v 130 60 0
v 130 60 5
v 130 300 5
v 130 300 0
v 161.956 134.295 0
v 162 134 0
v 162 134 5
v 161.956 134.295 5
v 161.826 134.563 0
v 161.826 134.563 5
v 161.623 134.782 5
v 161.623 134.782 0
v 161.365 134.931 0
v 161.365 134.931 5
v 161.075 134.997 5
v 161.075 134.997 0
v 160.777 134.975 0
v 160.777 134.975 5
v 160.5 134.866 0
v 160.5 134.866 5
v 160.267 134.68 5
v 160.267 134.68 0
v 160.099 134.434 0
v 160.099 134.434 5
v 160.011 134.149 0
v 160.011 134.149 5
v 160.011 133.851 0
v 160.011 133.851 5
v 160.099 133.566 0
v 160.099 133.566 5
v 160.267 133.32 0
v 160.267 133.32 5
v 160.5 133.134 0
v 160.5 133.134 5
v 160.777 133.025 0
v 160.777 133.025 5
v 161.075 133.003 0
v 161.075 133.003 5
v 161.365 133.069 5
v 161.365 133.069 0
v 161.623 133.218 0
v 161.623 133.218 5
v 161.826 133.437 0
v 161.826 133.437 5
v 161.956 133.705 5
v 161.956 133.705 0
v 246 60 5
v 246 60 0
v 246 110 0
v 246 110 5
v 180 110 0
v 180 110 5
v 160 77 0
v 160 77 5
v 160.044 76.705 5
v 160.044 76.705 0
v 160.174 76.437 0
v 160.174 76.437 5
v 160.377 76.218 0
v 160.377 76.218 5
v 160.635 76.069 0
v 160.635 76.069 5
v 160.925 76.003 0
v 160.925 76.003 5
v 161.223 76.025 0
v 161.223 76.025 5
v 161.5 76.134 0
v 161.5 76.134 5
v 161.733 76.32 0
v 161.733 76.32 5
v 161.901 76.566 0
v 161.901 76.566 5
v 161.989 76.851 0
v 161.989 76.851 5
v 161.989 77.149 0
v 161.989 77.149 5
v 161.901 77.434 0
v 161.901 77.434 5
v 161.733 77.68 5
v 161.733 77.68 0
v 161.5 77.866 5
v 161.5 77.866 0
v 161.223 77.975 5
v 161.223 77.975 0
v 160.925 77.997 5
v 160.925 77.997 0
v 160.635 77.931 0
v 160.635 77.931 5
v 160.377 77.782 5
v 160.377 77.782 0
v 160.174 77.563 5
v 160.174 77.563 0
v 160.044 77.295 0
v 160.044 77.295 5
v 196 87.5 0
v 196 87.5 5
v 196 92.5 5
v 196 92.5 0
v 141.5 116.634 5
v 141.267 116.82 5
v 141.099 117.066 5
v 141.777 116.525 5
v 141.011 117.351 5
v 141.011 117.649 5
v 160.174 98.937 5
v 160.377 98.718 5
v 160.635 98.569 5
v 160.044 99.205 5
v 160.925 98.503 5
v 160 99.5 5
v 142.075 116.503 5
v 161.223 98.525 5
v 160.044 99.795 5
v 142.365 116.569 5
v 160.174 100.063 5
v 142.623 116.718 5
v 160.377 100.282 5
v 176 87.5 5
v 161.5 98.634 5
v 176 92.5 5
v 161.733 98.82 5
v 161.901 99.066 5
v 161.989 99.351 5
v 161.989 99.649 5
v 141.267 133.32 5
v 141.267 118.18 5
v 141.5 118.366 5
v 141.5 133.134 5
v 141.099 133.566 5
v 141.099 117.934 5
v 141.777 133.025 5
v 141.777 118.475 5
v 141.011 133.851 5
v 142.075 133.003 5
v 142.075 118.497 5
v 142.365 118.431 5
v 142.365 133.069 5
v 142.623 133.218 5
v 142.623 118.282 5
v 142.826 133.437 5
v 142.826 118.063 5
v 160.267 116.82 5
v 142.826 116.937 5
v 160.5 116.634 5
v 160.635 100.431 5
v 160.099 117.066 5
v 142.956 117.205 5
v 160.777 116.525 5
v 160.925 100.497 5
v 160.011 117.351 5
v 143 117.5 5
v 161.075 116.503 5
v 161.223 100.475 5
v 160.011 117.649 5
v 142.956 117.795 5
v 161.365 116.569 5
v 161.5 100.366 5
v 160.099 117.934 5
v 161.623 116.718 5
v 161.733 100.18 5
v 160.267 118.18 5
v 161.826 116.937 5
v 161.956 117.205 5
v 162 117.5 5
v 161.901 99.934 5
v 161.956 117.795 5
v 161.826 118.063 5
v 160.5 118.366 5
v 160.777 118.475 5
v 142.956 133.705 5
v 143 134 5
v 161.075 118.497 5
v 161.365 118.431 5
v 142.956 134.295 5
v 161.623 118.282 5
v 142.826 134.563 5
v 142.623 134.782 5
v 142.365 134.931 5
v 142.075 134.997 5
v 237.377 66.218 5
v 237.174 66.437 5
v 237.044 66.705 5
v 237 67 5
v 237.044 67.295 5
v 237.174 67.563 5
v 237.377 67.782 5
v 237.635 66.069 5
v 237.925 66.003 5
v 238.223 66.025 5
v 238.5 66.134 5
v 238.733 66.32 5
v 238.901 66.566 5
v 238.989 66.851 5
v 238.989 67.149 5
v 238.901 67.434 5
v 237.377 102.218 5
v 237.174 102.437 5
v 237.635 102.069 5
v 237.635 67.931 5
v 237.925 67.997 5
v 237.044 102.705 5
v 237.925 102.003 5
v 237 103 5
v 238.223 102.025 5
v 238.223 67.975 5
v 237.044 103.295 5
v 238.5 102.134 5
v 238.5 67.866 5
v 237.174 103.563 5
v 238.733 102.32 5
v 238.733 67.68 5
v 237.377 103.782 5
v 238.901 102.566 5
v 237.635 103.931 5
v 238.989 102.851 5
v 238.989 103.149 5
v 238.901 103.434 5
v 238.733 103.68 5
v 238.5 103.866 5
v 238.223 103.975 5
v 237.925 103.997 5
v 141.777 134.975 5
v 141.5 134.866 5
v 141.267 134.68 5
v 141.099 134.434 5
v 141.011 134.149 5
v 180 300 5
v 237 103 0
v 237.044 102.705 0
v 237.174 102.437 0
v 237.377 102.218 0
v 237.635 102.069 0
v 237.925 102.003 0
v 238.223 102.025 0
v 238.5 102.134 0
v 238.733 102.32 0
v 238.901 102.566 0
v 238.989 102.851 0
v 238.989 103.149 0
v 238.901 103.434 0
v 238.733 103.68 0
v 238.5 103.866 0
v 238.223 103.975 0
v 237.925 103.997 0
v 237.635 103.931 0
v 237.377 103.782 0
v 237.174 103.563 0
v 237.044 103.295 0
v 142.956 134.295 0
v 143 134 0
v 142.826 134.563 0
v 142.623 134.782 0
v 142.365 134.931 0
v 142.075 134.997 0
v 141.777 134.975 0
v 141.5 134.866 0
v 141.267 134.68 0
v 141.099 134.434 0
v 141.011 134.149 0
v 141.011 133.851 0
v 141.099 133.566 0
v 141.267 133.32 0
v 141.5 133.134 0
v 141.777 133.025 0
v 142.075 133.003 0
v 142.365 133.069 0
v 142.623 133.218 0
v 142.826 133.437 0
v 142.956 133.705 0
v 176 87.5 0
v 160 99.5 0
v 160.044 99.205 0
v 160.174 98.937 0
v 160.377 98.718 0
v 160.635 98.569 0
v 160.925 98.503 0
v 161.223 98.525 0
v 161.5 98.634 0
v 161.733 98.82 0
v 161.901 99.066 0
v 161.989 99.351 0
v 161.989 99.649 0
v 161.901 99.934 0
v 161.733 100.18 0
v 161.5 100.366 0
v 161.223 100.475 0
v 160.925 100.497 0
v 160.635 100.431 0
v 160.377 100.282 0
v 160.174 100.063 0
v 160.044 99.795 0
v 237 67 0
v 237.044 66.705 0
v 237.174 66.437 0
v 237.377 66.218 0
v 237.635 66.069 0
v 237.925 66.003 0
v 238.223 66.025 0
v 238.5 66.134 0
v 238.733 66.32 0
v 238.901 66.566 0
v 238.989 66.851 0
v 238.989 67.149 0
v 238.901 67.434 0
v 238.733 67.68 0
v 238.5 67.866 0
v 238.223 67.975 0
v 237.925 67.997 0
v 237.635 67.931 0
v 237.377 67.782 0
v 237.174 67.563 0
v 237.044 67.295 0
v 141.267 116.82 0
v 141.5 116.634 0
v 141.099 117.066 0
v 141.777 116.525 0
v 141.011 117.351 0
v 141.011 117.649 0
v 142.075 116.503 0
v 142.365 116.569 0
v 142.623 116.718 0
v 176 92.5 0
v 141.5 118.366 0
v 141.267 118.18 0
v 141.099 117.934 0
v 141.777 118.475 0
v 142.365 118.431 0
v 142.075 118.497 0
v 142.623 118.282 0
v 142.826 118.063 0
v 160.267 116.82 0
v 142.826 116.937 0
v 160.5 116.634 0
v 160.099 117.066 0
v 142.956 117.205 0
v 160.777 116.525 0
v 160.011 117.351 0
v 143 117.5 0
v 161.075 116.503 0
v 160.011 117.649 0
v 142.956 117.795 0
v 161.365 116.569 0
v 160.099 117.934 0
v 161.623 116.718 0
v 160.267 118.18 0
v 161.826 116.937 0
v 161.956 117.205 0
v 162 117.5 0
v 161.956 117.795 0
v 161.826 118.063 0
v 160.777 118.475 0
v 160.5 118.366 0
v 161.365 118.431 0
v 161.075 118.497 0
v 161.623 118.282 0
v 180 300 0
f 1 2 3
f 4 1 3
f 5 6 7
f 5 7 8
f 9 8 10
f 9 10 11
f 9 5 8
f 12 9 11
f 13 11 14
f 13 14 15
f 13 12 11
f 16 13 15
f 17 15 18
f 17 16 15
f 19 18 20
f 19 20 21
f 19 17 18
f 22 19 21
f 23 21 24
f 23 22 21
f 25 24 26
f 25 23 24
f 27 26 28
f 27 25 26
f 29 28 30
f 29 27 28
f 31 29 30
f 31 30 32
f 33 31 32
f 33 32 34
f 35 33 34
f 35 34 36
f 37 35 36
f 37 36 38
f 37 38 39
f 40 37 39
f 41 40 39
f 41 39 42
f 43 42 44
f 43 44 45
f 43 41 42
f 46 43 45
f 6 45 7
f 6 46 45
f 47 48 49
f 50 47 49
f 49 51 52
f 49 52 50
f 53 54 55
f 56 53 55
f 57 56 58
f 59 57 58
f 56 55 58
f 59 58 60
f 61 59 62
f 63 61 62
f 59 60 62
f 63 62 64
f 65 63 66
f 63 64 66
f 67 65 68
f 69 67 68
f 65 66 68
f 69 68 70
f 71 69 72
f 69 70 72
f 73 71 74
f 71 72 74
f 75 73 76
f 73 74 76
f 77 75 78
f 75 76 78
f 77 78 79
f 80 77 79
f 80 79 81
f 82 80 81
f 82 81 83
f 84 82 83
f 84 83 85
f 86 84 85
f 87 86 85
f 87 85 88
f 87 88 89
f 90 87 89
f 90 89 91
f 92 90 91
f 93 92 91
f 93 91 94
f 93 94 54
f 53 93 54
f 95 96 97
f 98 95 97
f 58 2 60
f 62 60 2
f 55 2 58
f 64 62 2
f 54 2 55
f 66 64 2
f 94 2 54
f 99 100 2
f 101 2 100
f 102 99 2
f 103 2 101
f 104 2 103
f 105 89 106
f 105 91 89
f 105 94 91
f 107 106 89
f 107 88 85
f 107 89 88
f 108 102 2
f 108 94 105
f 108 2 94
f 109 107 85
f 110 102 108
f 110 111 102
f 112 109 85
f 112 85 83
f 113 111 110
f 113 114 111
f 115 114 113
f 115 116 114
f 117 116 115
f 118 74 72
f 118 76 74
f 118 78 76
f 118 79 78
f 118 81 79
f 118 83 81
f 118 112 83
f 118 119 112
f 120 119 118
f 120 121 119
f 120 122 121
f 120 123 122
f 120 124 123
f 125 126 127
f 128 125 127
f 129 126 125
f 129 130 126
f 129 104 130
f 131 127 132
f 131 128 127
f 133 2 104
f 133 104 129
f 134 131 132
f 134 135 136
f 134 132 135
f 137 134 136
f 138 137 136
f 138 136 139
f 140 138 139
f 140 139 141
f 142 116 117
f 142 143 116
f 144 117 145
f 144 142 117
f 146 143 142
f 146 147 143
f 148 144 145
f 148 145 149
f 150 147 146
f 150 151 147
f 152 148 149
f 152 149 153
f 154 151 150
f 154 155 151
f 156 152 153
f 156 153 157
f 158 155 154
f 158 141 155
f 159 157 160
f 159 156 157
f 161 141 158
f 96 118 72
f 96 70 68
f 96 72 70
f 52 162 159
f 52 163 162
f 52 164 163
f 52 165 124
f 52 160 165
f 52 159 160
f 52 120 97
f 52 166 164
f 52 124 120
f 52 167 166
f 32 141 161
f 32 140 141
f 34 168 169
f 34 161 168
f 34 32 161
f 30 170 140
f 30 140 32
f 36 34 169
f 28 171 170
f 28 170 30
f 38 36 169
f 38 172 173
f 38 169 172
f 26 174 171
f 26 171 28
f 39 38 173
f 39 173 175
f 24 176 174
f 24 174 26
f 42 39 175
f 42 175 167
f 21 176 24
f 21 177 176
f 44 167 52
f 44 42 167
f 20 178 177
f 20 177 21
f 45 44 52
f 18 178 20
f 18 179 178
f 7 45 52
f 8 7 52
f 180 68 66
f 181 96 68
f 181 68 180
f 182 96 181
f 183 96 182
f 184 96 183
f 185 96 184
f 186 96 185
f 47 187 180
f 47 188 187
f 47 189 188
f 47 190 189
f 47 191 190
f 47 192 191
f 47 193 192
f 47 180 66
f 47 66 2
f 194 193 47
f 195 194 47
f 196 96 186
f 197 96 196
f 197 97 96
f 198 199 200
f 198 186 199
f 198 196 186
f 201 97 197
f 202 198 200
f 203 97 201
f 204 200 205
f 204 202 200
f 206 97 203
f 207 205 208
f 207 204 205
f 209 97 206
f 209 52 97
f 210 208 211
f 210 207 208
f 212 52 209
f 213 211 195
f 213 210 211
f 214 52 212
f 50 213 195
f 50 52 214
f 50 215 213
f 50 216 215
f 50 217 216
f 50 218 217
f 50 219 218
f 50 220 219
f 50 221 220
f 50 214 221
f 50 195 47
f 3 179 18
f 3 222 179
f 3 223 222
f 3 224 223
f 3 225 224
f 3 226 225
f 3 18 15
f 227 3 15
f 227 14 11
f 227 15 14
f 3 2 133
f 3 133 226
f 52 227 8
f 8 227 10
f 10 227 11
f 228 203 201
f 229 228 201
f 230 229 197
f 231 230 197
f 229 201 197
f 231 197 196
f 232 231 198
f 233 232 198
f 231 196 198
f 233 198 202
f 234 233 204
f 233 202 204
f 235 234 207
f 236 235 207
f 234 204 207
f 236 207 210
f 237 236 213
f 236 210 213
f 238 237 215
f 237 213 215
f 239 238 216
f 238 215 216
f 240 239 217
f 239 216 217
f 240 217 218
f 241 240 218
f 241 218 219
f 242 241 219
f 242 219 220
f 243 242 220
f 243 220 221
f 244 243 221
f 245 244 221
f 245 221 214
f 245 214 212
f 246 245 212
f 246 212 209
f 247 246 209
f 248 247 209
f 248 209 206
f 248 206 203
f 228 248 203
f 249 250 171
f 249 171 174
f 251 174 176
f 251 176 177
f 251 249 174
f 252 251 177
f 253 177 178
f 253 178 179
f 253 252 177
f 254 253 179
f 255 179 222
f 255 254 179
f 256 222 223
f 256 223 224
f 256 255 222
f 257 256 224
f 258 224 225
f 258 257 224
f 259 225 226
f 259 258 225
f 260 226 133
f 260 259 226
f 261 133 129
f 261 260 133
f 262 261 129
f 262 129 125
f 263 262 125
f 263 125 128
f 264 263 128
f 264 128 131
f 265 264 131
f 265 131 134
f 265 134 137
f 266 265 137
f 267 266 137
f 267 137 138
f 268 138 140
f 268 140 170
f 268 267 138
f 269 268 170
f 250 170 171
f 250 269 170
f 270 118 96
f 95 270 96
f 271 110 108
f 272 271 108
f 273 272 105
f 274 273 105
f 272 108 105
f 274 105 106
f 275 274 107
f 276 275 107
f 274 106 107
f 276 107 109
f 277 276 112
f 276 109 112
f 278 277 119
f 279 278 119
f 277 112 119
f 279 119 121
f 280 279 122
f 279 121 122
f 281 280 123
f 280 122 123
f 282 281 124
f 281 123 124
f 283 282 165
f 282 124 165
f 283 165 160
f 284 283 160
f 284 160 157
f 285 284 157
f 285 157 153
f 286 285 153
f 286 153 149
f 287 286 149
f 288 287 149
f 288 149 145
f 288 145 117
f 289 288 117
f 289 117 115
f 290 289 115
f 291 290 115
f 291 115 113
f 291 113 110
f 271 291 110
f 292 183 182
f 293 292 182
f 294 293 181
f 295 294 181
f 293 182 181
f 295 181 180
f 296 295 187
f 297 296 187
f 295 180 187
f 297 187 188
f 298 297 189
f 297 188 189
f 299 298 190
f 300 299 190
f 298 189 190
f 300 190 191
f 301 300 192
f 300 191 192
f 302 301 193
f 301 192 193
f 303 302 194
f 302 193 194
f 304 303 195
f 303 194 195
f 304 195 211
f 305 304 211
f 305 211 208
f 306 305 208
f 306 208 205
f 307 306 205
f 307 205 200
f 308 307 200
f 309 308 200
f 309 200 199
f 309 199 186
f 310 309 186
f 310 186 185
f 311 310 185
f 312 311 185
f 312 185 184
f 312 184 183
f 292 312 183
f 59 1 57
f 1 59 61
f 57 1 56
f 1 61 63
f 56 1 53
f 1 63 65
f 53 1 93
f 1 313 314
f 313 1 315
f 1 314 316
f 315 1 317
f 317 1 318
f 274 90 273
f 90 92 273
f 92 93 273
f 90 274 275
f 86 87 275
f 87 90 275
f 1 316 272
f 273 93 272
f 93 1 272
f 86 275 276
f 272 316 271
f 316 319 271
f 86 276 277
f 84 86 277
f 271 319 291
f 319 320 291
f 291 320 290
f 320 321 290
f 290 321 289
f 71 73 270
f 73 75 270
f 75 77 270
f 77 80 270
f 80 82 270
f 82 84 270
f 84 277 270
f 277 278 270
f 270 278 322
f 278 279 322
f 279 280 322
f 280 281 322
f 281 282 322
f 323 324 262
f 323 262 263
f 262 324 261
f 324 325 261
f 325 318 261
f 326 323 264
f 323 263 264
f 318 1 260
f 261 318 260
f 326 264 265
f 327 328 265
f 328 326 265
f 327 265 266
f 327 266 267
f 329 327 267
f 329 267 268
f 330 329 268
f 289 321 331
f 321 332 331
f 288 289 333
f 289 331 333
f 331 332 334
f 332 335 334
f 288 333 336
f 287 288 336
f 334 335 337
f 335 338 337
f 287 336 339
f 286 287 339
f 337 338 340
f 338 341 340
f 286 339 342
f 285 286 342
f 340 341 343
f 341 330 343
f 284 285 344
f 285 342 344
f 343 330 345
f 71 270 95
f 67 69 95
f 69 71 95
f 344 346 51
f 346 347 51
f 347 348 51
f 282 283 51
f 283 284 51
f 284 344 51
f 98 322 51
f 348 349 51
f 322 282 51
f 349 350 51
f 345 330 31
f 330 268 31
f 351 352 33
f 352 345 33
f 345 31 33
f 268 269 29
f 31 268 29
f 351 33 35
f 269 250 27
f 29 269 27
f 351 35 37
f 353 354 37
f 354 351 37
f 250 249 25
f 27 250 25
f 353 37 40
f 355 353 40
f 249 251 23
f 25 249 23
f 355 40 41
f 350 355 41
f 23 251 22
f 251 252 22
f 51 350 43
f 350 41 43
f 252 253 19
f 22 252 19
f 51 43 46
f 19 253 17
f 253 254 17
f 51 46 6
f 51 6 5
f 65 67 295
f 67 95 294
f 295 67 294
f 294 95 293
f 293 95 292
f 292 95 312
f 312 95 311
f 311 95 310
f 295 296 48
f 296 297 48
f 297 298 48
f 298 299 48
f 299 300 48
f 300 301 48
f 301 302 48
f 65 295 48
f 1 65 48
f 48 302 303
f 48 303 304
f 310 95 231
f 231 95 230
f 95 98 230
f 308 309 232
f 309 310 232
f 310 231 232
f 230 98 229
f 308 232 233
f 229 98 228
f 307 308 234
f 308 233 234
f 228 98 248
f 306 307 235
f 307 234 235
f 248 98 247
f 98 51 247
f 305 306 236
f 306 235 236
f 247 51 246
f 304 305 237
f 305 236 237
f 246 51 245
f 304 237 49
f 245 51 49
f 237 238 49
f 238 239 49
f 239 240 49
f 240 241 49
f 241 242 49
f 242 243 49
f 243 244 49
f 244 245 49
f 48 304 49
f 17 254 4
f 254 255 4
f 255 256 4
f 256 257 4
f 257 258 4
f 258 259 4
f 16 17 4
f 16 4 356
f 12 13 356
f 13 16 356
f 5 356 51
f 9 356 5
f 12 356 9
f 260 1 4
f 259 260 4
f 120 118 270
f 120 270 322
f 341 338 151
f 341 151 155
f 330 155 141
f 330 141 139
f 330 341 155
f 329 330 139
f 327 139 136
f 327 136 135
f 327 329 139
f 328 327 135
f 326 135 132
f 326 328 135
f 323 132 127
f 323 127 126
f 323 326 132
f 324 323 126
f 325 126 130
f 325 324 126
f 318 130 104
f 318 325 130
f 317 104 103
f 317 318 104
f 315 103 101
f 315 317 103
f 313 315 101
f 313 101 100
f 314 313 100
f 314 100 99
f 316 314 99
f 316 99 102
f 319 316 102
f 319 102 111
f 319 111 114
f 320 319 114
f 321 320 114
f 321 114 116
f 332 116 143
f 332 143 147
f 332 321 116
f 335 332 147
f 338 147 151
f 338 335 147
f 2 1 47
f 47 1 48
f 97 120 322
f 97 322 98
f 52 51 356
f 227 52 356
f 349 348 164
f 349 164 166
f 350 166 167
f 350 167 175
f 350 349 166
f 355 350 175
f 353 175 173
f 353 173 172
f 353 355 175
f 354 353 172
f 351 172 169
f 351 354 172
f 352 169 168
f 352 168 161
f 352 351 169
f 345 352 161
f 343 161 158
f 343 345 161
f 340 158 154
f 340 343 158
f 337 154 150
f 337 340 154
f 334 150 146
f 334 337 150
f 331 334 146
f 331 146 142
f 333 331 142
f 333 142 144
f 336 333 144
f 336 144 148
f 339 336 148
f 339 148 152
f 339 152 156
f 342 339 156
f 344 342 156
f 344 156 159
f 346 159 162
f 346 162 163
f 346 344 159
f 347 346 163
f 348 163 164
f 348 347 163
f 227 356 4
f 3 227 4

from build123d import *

# Parameters (mm, degrees)
SKETCH1_W           = 66
SKETCH1_H           = 50
SKETCH1_R           = 1
BOSS_EXTRUDE1_DEPTH = 5
SKETCH2_R           = 1
CUT_EXTRUDE1_DEPTH  = 388.996134001
SKETCH3_R           = 1
SKETCH3_W           = 20
SKETCH3_H           = 5
CUT_EXTRUDE2_DEPTH  = 388.996134001
CUT_EXTRUDE3_DEPTH  = 388.996134001


with BuildPart() as part:
    # Sketch1 → Boss-Extrude1 (new body)
    # profile 1 of 3: a face of its own
    with BuildSketch(Plane.XY):
        with Locations((-33, 85)):
            Rectangle(SKETCH1_W, SKETCH1_H)
    # profile 2 of 3: a face of its own
    with BuildSketch(Plane.XY):
        Polygon((0, 60), (0, 0), (180, 0), (180, 60), (180, 110), (180, 300), (130, 300), (130, 150), (50, 150), (50, 300), (0, 300), (0, 110), align=None)
        with Locations((19, 117.5)):
            Circle(SKETCH1_R, mode=Mode.SUBTRACT)
        with Locations((38, 117.5)):
            Circle(SKETCH1_R, mode=Mode.SUBTRACT)
        with Locations((19, 134)):
            Circle(SKETCH1_R, mode=Mode.SUBTRACT)
        with Locations((38, 134)):
            Circle(SKETCH1_R, mode=Mode.SUBTRACT)
        with Locations((142, 117.5)):
            Circle(SKETCH1_R, mode=Mode.SUBTRACT)
        with Locations((161, 117.5)):
            Circle(SKETCH1_R, mode=Mode.SUBTRACT)
        with Locations((142, 134)):
            Circle(SKETCH1_R, mode=Mode.SUBTRACT)
        with Locations((161, 134)):
            Circle(SKETCH1_R, mode=Mode.SUBTRACT)
    # profile 3 of 3: a face of its own
    with BuildSketch(Plane.XY):
        with Locations((213, 85)):
            Rectangle(SKETCH1_W, SKETCH1_H)
    extrude(amount=BOSS_EXTRUDE1_DEPTH)

    # Sketch2 → Cut-Extrude1 (cut, through all)
    with BuildSketch(Plane.XY.offset(5)):
        with Locations((-58, 103)):
            Circle(SKETCH2_R)
        with Locations((-58, 67)):
            Circle(SKETCH2_R)
        with Locations(Location((238, 67, 0), (0, 0, 180))):
            Circle(SKETCH2_R)
        with Locations(Location((238, 103, 0), (0, 0, 180))):
            Circle(SKETCH2_R)
    extrude(amount=-CUT_EXTRUDE1_DEPTH, mode=Mode.SUBTRACT)

    # Sketch3 → Cut-Extrude2 (cut, through all)
    with BuildSketch(Plane.XY.offset(5)):
        with Locations((19, 77)):
            Circle(SKETCH3_R)
        with Locations((19, 99.5)):
            Circle(SKETCH3_R)
        with Locations(Location((161, 77, 0), (0, 0, 180))):
            Circle(SKETCH3_R)
        with Locations(Location((161, 99.5, 0), (0, 0, 180))):
            Circle(SKETCH3_R)
        with Locations((-6, 90)):
            Rectangle(SKETCH3_W, SKETCH3_H)
        with Locations((186, 90)):
            Rectangle(SKETCH3_W, SKETCH3_H)
    extrude(amount=-CUT_EXTRUDE2_DEPTH, mode=Mode.SUBTRACT)

    # Sketch4 → Cut-Extrude3 (cut, through all)
    with BuildSketch(Plane.XY.offset(5)):
        Polygon((180, 60), (130, 60), (130, 150), (65.062754068, 311.897276324), (-51.051297303, 321.248743549), (-107.939389585, -9.16976505), (175.332138424, -20.859099081), (198.321162017, 8.753880463), align=None)
    extrude(amount=-CUT_EXTRUDE3_DEPTH, mode=Mode.SUBTRACT)


solid = part.part
